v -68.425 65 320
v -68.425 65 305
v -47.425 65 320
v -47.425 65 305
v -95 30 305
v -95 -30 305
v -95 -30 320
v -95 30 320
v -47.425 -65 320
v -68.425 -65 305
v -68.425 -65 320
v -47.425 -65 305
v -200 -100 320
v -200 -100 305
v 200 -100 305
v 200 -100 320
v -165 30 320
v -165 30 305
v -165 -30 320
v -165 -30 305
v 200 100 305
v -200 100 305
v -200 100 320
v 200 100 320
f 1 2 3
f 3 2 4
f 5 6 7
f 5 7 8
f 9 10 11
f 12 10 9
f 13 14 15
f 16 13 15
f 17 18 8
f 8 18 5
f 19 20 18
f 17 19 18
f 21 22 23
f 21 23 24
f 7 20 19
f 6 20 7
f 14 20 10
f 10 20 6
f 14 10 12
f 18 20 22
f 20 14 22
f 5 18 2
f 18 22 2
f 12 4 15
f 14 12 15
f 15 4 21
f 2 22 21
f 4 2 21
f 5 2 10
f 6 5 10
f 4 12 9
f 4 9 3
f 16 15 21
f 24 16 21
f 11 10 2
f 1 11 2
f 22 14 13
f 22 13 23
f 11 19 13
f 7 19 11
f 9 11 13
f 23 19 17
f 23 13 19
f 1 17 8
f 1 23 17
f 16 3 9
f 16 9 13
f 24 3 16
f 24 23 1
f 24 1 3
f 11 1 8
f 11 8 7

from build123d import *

# Parameters (mm, degrees)
SKETCH053_W     = 400
SKETCH053_H     = 200
PAD027_DEPTH    = 15
SKETCH052_W     = 70
SKETCH052_H     = 60
POCKET018_DEPTH = 15
SKETCH061_W     = 21
SKETCH061_H     = 130
POCKET020_DEPTH = 15.001


with BuildPart() as part:
    # Sketch053 → Pad027 (new body)
    with BuildSketch(Plane.XY):
        Rectangle(SKETCH053_W, SKETCH053_H)
    extrude(amount=PAD027_DEPTH)

    # Sketch052 → Pocket018 (cut)
    with BuildSketch(Plane.XY):
        with Locations((-130, 0)):
            Rectangle(SKETCH052_W, SKETCH052_H)
    extrude(amount=POCKET018_DEPTH, mode=Mode.SUBTRACT)

    # Sketch061 → Pocket020 (cut, through all)
    with BuildSketch(Plane.XY):
        with Locations((-57.925, 0)):
            Rectangle(SKETCH061_W, SKETCH061_H)
    extrude(amount=POCKET020_DEPTH, mode=Mode.SUBTRACT)


with BuildPart() as part_1:
    # Body052 placement: moved
    add(part.part.moved(Location((0, 0, 305))))


solid = part_1.part
